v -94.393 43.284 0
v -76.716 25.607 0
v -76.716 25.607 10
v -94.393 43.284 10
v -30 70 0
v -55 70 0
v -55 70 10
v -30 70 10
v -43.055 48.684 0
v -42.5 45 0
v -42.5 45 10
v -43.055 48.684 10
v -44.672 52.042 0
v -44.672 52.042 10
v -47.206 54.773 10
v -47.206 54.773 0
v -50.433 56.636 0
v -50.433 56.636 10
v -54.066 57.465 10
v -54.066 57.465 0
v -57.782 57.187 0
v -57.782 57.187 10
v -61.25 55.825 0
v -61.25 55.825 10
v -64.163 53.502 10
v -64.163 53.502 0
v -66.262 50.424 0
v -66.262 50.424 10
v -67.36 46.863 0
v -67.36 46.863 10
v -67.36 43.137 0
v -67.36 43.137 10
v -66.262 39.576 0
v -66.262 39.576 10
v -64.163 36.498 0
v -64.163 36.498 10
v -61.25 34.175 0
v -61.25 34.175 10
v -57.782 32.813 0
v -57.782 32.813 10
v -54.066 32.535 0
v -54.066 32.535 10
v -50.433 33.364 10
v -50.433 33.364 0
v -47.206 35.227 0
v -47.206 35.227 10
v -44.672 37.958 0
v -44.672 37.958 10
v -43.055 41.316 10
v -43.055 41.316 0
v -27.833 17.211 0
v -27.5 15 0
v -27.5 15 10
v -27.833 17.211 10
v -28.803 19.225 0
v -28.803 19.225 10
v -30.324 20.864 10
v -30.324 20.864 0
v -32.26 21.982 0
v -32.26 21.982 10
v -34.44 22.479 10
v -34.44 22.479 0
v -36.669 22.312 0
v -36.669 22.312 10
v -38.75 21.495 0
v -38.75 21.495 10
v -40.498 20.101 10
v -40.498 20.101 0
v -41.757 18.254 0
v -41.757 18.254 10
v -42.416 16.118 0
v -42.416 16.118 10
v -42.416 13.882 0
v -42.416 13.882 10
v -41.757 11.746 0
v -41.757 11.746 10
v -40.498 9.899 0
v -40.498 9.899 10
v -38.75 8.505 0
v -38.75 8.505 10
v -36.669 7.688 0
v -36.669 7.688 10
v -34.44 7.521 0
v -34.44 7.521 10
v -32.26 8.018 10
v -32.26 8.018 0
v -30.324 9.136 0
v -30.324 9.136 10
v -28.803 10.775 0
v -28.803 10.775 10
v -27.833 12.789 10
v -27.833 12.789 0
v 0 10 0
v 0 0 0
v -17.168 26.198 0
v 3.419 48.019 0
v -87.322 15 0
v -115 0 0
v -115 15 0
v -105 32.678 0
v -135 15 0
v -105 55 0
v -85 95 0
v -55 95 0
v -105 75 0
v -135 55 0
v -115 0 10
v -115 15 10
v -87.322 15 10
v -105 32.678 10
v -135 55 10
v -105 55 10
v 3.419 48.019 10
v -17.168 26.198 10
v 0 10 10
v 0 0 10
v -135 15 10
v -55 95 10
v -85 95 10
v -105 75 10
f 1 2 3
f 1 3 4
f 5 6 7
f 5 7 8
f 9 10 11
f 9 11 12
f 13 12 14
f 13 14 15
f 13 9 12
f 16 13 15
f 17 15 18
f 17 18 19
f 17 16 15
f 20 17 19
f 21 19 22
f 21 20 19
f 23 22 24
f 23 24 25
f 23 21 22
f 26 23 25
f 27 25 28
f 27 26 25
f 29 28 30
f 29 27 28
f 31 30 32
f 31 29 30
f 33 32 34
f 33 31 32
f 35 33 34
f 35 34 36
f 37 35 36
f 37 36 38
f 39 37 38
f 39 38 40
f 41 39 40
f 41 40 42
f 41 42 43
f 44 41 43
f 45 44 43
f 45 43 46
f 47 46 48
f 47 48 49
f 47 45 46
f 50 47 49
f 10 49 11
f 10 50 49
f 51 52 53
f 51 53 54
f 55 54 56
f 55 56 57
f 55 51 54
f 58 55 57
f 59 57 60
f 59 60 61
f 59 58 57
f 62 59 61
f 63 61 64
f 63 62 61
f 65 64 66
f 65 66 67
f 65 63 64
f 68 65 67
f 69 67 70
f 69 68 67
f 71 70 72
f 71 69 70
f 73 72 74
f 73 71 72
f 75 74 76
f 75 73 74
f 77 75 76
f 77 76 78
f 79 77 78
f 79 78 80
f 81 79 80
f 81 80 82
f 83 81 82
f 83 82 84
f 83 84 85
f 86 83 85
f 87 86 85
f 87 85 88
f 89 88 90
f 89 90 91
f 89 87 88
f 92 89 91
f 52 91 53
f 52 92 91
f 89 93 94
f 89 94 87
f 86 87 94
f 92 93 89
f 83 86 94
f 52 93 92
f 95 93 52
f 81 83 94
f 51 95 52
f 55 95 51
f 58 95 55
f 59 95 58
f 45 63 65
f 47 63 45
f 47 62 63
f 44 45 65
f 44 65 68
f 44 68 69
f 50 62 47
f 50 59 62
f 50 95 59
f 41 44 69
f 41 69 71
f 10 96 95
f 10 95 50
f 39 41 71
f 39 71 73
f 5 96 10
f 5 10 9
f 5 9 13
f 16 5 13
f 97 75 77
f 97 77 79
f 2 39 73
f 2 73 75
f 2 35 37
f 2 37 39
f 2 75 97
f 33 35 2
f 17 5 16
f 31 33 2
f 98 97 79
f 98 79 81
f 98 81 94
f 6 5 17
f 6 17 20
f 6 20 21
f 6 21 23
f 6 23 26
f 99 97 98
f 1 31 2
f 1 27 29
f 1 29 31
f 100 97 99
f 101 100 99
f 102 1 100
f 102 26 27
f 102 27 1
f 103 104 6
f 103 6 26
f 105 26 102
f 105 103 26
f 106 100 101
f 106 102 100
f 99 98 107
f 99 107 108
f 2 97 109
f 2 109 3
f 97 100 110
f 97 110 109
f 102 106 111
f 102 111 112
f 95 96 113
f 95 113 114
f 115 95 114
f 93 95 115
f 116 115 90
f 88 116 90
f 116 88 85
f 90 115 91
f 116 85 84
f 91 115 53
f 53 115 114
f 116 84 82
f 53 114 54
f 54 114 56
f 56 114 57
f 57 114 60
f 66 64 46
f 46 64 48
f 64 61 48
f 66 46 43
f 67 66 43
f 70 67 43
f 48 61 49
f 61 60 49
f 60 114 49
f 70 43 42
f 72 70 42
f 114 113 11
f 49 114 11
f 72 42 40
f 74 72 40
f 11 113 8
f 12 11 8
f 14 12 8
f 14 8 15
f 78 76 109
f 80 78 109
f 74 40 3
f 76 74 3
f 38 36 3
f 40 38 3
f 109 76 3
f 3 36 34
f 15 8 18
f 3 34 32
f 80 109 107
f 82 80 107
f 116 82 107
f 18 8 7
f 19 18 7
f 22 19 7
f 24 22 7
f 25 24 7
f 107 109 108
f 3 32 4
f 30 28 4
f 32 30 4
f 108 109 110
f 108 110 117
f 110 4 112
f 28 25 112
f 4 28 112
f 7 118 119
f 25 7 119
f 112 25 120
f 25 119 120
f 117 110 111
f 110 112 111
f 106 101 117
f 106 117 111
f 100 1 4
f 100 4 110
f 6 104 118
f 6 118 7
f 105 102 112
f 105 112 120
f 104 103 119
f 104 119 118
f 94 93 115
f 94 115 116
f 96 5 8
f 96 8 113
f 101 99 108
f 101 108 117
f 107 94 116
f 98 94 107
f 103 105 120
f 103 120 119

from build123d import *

# Parameters (mm, degrees)
CROQUIS1_R              = 12.5
CROQUIS1_R_2            = 7.5
SALIENTE_EXTRUIR1_DEPTH = 10


with BuildPart() as part:
    # Croquis1 → Saliente-Extruir1 (new body)
    with BuildSketch(Plane.XY):
        Polygon((0, 0), (-115, 0), (-115, 15), (-135, 15), (-135, 55), (-105, 55), (-105, 75), (-85, 95), (-55, 95), (-55, 70), (-30, 70), (3.419129876, 48.019059203), (-17.168499063, 26.198208287), (0, 10), align=None)
        with Locations((-55, 45)):
            Circle(CROQUIS1_R, mode=Mode.SUBTRACT)
        with Locations((-35, 15)):
            Circle(CROQUIS1_R_2, mode=Mode.SUBTRACT)
        Polygon((-105, 32.67766953), (-87.32233047, 15), (-76.715728753, 25.606601718), (-94.393398282, 43.284271247), align=None, mode=Mode.SUBTRACT)
    extrude(amount=SALIENTE_EXTRUIR1_DEPTH)


solid = part.part
